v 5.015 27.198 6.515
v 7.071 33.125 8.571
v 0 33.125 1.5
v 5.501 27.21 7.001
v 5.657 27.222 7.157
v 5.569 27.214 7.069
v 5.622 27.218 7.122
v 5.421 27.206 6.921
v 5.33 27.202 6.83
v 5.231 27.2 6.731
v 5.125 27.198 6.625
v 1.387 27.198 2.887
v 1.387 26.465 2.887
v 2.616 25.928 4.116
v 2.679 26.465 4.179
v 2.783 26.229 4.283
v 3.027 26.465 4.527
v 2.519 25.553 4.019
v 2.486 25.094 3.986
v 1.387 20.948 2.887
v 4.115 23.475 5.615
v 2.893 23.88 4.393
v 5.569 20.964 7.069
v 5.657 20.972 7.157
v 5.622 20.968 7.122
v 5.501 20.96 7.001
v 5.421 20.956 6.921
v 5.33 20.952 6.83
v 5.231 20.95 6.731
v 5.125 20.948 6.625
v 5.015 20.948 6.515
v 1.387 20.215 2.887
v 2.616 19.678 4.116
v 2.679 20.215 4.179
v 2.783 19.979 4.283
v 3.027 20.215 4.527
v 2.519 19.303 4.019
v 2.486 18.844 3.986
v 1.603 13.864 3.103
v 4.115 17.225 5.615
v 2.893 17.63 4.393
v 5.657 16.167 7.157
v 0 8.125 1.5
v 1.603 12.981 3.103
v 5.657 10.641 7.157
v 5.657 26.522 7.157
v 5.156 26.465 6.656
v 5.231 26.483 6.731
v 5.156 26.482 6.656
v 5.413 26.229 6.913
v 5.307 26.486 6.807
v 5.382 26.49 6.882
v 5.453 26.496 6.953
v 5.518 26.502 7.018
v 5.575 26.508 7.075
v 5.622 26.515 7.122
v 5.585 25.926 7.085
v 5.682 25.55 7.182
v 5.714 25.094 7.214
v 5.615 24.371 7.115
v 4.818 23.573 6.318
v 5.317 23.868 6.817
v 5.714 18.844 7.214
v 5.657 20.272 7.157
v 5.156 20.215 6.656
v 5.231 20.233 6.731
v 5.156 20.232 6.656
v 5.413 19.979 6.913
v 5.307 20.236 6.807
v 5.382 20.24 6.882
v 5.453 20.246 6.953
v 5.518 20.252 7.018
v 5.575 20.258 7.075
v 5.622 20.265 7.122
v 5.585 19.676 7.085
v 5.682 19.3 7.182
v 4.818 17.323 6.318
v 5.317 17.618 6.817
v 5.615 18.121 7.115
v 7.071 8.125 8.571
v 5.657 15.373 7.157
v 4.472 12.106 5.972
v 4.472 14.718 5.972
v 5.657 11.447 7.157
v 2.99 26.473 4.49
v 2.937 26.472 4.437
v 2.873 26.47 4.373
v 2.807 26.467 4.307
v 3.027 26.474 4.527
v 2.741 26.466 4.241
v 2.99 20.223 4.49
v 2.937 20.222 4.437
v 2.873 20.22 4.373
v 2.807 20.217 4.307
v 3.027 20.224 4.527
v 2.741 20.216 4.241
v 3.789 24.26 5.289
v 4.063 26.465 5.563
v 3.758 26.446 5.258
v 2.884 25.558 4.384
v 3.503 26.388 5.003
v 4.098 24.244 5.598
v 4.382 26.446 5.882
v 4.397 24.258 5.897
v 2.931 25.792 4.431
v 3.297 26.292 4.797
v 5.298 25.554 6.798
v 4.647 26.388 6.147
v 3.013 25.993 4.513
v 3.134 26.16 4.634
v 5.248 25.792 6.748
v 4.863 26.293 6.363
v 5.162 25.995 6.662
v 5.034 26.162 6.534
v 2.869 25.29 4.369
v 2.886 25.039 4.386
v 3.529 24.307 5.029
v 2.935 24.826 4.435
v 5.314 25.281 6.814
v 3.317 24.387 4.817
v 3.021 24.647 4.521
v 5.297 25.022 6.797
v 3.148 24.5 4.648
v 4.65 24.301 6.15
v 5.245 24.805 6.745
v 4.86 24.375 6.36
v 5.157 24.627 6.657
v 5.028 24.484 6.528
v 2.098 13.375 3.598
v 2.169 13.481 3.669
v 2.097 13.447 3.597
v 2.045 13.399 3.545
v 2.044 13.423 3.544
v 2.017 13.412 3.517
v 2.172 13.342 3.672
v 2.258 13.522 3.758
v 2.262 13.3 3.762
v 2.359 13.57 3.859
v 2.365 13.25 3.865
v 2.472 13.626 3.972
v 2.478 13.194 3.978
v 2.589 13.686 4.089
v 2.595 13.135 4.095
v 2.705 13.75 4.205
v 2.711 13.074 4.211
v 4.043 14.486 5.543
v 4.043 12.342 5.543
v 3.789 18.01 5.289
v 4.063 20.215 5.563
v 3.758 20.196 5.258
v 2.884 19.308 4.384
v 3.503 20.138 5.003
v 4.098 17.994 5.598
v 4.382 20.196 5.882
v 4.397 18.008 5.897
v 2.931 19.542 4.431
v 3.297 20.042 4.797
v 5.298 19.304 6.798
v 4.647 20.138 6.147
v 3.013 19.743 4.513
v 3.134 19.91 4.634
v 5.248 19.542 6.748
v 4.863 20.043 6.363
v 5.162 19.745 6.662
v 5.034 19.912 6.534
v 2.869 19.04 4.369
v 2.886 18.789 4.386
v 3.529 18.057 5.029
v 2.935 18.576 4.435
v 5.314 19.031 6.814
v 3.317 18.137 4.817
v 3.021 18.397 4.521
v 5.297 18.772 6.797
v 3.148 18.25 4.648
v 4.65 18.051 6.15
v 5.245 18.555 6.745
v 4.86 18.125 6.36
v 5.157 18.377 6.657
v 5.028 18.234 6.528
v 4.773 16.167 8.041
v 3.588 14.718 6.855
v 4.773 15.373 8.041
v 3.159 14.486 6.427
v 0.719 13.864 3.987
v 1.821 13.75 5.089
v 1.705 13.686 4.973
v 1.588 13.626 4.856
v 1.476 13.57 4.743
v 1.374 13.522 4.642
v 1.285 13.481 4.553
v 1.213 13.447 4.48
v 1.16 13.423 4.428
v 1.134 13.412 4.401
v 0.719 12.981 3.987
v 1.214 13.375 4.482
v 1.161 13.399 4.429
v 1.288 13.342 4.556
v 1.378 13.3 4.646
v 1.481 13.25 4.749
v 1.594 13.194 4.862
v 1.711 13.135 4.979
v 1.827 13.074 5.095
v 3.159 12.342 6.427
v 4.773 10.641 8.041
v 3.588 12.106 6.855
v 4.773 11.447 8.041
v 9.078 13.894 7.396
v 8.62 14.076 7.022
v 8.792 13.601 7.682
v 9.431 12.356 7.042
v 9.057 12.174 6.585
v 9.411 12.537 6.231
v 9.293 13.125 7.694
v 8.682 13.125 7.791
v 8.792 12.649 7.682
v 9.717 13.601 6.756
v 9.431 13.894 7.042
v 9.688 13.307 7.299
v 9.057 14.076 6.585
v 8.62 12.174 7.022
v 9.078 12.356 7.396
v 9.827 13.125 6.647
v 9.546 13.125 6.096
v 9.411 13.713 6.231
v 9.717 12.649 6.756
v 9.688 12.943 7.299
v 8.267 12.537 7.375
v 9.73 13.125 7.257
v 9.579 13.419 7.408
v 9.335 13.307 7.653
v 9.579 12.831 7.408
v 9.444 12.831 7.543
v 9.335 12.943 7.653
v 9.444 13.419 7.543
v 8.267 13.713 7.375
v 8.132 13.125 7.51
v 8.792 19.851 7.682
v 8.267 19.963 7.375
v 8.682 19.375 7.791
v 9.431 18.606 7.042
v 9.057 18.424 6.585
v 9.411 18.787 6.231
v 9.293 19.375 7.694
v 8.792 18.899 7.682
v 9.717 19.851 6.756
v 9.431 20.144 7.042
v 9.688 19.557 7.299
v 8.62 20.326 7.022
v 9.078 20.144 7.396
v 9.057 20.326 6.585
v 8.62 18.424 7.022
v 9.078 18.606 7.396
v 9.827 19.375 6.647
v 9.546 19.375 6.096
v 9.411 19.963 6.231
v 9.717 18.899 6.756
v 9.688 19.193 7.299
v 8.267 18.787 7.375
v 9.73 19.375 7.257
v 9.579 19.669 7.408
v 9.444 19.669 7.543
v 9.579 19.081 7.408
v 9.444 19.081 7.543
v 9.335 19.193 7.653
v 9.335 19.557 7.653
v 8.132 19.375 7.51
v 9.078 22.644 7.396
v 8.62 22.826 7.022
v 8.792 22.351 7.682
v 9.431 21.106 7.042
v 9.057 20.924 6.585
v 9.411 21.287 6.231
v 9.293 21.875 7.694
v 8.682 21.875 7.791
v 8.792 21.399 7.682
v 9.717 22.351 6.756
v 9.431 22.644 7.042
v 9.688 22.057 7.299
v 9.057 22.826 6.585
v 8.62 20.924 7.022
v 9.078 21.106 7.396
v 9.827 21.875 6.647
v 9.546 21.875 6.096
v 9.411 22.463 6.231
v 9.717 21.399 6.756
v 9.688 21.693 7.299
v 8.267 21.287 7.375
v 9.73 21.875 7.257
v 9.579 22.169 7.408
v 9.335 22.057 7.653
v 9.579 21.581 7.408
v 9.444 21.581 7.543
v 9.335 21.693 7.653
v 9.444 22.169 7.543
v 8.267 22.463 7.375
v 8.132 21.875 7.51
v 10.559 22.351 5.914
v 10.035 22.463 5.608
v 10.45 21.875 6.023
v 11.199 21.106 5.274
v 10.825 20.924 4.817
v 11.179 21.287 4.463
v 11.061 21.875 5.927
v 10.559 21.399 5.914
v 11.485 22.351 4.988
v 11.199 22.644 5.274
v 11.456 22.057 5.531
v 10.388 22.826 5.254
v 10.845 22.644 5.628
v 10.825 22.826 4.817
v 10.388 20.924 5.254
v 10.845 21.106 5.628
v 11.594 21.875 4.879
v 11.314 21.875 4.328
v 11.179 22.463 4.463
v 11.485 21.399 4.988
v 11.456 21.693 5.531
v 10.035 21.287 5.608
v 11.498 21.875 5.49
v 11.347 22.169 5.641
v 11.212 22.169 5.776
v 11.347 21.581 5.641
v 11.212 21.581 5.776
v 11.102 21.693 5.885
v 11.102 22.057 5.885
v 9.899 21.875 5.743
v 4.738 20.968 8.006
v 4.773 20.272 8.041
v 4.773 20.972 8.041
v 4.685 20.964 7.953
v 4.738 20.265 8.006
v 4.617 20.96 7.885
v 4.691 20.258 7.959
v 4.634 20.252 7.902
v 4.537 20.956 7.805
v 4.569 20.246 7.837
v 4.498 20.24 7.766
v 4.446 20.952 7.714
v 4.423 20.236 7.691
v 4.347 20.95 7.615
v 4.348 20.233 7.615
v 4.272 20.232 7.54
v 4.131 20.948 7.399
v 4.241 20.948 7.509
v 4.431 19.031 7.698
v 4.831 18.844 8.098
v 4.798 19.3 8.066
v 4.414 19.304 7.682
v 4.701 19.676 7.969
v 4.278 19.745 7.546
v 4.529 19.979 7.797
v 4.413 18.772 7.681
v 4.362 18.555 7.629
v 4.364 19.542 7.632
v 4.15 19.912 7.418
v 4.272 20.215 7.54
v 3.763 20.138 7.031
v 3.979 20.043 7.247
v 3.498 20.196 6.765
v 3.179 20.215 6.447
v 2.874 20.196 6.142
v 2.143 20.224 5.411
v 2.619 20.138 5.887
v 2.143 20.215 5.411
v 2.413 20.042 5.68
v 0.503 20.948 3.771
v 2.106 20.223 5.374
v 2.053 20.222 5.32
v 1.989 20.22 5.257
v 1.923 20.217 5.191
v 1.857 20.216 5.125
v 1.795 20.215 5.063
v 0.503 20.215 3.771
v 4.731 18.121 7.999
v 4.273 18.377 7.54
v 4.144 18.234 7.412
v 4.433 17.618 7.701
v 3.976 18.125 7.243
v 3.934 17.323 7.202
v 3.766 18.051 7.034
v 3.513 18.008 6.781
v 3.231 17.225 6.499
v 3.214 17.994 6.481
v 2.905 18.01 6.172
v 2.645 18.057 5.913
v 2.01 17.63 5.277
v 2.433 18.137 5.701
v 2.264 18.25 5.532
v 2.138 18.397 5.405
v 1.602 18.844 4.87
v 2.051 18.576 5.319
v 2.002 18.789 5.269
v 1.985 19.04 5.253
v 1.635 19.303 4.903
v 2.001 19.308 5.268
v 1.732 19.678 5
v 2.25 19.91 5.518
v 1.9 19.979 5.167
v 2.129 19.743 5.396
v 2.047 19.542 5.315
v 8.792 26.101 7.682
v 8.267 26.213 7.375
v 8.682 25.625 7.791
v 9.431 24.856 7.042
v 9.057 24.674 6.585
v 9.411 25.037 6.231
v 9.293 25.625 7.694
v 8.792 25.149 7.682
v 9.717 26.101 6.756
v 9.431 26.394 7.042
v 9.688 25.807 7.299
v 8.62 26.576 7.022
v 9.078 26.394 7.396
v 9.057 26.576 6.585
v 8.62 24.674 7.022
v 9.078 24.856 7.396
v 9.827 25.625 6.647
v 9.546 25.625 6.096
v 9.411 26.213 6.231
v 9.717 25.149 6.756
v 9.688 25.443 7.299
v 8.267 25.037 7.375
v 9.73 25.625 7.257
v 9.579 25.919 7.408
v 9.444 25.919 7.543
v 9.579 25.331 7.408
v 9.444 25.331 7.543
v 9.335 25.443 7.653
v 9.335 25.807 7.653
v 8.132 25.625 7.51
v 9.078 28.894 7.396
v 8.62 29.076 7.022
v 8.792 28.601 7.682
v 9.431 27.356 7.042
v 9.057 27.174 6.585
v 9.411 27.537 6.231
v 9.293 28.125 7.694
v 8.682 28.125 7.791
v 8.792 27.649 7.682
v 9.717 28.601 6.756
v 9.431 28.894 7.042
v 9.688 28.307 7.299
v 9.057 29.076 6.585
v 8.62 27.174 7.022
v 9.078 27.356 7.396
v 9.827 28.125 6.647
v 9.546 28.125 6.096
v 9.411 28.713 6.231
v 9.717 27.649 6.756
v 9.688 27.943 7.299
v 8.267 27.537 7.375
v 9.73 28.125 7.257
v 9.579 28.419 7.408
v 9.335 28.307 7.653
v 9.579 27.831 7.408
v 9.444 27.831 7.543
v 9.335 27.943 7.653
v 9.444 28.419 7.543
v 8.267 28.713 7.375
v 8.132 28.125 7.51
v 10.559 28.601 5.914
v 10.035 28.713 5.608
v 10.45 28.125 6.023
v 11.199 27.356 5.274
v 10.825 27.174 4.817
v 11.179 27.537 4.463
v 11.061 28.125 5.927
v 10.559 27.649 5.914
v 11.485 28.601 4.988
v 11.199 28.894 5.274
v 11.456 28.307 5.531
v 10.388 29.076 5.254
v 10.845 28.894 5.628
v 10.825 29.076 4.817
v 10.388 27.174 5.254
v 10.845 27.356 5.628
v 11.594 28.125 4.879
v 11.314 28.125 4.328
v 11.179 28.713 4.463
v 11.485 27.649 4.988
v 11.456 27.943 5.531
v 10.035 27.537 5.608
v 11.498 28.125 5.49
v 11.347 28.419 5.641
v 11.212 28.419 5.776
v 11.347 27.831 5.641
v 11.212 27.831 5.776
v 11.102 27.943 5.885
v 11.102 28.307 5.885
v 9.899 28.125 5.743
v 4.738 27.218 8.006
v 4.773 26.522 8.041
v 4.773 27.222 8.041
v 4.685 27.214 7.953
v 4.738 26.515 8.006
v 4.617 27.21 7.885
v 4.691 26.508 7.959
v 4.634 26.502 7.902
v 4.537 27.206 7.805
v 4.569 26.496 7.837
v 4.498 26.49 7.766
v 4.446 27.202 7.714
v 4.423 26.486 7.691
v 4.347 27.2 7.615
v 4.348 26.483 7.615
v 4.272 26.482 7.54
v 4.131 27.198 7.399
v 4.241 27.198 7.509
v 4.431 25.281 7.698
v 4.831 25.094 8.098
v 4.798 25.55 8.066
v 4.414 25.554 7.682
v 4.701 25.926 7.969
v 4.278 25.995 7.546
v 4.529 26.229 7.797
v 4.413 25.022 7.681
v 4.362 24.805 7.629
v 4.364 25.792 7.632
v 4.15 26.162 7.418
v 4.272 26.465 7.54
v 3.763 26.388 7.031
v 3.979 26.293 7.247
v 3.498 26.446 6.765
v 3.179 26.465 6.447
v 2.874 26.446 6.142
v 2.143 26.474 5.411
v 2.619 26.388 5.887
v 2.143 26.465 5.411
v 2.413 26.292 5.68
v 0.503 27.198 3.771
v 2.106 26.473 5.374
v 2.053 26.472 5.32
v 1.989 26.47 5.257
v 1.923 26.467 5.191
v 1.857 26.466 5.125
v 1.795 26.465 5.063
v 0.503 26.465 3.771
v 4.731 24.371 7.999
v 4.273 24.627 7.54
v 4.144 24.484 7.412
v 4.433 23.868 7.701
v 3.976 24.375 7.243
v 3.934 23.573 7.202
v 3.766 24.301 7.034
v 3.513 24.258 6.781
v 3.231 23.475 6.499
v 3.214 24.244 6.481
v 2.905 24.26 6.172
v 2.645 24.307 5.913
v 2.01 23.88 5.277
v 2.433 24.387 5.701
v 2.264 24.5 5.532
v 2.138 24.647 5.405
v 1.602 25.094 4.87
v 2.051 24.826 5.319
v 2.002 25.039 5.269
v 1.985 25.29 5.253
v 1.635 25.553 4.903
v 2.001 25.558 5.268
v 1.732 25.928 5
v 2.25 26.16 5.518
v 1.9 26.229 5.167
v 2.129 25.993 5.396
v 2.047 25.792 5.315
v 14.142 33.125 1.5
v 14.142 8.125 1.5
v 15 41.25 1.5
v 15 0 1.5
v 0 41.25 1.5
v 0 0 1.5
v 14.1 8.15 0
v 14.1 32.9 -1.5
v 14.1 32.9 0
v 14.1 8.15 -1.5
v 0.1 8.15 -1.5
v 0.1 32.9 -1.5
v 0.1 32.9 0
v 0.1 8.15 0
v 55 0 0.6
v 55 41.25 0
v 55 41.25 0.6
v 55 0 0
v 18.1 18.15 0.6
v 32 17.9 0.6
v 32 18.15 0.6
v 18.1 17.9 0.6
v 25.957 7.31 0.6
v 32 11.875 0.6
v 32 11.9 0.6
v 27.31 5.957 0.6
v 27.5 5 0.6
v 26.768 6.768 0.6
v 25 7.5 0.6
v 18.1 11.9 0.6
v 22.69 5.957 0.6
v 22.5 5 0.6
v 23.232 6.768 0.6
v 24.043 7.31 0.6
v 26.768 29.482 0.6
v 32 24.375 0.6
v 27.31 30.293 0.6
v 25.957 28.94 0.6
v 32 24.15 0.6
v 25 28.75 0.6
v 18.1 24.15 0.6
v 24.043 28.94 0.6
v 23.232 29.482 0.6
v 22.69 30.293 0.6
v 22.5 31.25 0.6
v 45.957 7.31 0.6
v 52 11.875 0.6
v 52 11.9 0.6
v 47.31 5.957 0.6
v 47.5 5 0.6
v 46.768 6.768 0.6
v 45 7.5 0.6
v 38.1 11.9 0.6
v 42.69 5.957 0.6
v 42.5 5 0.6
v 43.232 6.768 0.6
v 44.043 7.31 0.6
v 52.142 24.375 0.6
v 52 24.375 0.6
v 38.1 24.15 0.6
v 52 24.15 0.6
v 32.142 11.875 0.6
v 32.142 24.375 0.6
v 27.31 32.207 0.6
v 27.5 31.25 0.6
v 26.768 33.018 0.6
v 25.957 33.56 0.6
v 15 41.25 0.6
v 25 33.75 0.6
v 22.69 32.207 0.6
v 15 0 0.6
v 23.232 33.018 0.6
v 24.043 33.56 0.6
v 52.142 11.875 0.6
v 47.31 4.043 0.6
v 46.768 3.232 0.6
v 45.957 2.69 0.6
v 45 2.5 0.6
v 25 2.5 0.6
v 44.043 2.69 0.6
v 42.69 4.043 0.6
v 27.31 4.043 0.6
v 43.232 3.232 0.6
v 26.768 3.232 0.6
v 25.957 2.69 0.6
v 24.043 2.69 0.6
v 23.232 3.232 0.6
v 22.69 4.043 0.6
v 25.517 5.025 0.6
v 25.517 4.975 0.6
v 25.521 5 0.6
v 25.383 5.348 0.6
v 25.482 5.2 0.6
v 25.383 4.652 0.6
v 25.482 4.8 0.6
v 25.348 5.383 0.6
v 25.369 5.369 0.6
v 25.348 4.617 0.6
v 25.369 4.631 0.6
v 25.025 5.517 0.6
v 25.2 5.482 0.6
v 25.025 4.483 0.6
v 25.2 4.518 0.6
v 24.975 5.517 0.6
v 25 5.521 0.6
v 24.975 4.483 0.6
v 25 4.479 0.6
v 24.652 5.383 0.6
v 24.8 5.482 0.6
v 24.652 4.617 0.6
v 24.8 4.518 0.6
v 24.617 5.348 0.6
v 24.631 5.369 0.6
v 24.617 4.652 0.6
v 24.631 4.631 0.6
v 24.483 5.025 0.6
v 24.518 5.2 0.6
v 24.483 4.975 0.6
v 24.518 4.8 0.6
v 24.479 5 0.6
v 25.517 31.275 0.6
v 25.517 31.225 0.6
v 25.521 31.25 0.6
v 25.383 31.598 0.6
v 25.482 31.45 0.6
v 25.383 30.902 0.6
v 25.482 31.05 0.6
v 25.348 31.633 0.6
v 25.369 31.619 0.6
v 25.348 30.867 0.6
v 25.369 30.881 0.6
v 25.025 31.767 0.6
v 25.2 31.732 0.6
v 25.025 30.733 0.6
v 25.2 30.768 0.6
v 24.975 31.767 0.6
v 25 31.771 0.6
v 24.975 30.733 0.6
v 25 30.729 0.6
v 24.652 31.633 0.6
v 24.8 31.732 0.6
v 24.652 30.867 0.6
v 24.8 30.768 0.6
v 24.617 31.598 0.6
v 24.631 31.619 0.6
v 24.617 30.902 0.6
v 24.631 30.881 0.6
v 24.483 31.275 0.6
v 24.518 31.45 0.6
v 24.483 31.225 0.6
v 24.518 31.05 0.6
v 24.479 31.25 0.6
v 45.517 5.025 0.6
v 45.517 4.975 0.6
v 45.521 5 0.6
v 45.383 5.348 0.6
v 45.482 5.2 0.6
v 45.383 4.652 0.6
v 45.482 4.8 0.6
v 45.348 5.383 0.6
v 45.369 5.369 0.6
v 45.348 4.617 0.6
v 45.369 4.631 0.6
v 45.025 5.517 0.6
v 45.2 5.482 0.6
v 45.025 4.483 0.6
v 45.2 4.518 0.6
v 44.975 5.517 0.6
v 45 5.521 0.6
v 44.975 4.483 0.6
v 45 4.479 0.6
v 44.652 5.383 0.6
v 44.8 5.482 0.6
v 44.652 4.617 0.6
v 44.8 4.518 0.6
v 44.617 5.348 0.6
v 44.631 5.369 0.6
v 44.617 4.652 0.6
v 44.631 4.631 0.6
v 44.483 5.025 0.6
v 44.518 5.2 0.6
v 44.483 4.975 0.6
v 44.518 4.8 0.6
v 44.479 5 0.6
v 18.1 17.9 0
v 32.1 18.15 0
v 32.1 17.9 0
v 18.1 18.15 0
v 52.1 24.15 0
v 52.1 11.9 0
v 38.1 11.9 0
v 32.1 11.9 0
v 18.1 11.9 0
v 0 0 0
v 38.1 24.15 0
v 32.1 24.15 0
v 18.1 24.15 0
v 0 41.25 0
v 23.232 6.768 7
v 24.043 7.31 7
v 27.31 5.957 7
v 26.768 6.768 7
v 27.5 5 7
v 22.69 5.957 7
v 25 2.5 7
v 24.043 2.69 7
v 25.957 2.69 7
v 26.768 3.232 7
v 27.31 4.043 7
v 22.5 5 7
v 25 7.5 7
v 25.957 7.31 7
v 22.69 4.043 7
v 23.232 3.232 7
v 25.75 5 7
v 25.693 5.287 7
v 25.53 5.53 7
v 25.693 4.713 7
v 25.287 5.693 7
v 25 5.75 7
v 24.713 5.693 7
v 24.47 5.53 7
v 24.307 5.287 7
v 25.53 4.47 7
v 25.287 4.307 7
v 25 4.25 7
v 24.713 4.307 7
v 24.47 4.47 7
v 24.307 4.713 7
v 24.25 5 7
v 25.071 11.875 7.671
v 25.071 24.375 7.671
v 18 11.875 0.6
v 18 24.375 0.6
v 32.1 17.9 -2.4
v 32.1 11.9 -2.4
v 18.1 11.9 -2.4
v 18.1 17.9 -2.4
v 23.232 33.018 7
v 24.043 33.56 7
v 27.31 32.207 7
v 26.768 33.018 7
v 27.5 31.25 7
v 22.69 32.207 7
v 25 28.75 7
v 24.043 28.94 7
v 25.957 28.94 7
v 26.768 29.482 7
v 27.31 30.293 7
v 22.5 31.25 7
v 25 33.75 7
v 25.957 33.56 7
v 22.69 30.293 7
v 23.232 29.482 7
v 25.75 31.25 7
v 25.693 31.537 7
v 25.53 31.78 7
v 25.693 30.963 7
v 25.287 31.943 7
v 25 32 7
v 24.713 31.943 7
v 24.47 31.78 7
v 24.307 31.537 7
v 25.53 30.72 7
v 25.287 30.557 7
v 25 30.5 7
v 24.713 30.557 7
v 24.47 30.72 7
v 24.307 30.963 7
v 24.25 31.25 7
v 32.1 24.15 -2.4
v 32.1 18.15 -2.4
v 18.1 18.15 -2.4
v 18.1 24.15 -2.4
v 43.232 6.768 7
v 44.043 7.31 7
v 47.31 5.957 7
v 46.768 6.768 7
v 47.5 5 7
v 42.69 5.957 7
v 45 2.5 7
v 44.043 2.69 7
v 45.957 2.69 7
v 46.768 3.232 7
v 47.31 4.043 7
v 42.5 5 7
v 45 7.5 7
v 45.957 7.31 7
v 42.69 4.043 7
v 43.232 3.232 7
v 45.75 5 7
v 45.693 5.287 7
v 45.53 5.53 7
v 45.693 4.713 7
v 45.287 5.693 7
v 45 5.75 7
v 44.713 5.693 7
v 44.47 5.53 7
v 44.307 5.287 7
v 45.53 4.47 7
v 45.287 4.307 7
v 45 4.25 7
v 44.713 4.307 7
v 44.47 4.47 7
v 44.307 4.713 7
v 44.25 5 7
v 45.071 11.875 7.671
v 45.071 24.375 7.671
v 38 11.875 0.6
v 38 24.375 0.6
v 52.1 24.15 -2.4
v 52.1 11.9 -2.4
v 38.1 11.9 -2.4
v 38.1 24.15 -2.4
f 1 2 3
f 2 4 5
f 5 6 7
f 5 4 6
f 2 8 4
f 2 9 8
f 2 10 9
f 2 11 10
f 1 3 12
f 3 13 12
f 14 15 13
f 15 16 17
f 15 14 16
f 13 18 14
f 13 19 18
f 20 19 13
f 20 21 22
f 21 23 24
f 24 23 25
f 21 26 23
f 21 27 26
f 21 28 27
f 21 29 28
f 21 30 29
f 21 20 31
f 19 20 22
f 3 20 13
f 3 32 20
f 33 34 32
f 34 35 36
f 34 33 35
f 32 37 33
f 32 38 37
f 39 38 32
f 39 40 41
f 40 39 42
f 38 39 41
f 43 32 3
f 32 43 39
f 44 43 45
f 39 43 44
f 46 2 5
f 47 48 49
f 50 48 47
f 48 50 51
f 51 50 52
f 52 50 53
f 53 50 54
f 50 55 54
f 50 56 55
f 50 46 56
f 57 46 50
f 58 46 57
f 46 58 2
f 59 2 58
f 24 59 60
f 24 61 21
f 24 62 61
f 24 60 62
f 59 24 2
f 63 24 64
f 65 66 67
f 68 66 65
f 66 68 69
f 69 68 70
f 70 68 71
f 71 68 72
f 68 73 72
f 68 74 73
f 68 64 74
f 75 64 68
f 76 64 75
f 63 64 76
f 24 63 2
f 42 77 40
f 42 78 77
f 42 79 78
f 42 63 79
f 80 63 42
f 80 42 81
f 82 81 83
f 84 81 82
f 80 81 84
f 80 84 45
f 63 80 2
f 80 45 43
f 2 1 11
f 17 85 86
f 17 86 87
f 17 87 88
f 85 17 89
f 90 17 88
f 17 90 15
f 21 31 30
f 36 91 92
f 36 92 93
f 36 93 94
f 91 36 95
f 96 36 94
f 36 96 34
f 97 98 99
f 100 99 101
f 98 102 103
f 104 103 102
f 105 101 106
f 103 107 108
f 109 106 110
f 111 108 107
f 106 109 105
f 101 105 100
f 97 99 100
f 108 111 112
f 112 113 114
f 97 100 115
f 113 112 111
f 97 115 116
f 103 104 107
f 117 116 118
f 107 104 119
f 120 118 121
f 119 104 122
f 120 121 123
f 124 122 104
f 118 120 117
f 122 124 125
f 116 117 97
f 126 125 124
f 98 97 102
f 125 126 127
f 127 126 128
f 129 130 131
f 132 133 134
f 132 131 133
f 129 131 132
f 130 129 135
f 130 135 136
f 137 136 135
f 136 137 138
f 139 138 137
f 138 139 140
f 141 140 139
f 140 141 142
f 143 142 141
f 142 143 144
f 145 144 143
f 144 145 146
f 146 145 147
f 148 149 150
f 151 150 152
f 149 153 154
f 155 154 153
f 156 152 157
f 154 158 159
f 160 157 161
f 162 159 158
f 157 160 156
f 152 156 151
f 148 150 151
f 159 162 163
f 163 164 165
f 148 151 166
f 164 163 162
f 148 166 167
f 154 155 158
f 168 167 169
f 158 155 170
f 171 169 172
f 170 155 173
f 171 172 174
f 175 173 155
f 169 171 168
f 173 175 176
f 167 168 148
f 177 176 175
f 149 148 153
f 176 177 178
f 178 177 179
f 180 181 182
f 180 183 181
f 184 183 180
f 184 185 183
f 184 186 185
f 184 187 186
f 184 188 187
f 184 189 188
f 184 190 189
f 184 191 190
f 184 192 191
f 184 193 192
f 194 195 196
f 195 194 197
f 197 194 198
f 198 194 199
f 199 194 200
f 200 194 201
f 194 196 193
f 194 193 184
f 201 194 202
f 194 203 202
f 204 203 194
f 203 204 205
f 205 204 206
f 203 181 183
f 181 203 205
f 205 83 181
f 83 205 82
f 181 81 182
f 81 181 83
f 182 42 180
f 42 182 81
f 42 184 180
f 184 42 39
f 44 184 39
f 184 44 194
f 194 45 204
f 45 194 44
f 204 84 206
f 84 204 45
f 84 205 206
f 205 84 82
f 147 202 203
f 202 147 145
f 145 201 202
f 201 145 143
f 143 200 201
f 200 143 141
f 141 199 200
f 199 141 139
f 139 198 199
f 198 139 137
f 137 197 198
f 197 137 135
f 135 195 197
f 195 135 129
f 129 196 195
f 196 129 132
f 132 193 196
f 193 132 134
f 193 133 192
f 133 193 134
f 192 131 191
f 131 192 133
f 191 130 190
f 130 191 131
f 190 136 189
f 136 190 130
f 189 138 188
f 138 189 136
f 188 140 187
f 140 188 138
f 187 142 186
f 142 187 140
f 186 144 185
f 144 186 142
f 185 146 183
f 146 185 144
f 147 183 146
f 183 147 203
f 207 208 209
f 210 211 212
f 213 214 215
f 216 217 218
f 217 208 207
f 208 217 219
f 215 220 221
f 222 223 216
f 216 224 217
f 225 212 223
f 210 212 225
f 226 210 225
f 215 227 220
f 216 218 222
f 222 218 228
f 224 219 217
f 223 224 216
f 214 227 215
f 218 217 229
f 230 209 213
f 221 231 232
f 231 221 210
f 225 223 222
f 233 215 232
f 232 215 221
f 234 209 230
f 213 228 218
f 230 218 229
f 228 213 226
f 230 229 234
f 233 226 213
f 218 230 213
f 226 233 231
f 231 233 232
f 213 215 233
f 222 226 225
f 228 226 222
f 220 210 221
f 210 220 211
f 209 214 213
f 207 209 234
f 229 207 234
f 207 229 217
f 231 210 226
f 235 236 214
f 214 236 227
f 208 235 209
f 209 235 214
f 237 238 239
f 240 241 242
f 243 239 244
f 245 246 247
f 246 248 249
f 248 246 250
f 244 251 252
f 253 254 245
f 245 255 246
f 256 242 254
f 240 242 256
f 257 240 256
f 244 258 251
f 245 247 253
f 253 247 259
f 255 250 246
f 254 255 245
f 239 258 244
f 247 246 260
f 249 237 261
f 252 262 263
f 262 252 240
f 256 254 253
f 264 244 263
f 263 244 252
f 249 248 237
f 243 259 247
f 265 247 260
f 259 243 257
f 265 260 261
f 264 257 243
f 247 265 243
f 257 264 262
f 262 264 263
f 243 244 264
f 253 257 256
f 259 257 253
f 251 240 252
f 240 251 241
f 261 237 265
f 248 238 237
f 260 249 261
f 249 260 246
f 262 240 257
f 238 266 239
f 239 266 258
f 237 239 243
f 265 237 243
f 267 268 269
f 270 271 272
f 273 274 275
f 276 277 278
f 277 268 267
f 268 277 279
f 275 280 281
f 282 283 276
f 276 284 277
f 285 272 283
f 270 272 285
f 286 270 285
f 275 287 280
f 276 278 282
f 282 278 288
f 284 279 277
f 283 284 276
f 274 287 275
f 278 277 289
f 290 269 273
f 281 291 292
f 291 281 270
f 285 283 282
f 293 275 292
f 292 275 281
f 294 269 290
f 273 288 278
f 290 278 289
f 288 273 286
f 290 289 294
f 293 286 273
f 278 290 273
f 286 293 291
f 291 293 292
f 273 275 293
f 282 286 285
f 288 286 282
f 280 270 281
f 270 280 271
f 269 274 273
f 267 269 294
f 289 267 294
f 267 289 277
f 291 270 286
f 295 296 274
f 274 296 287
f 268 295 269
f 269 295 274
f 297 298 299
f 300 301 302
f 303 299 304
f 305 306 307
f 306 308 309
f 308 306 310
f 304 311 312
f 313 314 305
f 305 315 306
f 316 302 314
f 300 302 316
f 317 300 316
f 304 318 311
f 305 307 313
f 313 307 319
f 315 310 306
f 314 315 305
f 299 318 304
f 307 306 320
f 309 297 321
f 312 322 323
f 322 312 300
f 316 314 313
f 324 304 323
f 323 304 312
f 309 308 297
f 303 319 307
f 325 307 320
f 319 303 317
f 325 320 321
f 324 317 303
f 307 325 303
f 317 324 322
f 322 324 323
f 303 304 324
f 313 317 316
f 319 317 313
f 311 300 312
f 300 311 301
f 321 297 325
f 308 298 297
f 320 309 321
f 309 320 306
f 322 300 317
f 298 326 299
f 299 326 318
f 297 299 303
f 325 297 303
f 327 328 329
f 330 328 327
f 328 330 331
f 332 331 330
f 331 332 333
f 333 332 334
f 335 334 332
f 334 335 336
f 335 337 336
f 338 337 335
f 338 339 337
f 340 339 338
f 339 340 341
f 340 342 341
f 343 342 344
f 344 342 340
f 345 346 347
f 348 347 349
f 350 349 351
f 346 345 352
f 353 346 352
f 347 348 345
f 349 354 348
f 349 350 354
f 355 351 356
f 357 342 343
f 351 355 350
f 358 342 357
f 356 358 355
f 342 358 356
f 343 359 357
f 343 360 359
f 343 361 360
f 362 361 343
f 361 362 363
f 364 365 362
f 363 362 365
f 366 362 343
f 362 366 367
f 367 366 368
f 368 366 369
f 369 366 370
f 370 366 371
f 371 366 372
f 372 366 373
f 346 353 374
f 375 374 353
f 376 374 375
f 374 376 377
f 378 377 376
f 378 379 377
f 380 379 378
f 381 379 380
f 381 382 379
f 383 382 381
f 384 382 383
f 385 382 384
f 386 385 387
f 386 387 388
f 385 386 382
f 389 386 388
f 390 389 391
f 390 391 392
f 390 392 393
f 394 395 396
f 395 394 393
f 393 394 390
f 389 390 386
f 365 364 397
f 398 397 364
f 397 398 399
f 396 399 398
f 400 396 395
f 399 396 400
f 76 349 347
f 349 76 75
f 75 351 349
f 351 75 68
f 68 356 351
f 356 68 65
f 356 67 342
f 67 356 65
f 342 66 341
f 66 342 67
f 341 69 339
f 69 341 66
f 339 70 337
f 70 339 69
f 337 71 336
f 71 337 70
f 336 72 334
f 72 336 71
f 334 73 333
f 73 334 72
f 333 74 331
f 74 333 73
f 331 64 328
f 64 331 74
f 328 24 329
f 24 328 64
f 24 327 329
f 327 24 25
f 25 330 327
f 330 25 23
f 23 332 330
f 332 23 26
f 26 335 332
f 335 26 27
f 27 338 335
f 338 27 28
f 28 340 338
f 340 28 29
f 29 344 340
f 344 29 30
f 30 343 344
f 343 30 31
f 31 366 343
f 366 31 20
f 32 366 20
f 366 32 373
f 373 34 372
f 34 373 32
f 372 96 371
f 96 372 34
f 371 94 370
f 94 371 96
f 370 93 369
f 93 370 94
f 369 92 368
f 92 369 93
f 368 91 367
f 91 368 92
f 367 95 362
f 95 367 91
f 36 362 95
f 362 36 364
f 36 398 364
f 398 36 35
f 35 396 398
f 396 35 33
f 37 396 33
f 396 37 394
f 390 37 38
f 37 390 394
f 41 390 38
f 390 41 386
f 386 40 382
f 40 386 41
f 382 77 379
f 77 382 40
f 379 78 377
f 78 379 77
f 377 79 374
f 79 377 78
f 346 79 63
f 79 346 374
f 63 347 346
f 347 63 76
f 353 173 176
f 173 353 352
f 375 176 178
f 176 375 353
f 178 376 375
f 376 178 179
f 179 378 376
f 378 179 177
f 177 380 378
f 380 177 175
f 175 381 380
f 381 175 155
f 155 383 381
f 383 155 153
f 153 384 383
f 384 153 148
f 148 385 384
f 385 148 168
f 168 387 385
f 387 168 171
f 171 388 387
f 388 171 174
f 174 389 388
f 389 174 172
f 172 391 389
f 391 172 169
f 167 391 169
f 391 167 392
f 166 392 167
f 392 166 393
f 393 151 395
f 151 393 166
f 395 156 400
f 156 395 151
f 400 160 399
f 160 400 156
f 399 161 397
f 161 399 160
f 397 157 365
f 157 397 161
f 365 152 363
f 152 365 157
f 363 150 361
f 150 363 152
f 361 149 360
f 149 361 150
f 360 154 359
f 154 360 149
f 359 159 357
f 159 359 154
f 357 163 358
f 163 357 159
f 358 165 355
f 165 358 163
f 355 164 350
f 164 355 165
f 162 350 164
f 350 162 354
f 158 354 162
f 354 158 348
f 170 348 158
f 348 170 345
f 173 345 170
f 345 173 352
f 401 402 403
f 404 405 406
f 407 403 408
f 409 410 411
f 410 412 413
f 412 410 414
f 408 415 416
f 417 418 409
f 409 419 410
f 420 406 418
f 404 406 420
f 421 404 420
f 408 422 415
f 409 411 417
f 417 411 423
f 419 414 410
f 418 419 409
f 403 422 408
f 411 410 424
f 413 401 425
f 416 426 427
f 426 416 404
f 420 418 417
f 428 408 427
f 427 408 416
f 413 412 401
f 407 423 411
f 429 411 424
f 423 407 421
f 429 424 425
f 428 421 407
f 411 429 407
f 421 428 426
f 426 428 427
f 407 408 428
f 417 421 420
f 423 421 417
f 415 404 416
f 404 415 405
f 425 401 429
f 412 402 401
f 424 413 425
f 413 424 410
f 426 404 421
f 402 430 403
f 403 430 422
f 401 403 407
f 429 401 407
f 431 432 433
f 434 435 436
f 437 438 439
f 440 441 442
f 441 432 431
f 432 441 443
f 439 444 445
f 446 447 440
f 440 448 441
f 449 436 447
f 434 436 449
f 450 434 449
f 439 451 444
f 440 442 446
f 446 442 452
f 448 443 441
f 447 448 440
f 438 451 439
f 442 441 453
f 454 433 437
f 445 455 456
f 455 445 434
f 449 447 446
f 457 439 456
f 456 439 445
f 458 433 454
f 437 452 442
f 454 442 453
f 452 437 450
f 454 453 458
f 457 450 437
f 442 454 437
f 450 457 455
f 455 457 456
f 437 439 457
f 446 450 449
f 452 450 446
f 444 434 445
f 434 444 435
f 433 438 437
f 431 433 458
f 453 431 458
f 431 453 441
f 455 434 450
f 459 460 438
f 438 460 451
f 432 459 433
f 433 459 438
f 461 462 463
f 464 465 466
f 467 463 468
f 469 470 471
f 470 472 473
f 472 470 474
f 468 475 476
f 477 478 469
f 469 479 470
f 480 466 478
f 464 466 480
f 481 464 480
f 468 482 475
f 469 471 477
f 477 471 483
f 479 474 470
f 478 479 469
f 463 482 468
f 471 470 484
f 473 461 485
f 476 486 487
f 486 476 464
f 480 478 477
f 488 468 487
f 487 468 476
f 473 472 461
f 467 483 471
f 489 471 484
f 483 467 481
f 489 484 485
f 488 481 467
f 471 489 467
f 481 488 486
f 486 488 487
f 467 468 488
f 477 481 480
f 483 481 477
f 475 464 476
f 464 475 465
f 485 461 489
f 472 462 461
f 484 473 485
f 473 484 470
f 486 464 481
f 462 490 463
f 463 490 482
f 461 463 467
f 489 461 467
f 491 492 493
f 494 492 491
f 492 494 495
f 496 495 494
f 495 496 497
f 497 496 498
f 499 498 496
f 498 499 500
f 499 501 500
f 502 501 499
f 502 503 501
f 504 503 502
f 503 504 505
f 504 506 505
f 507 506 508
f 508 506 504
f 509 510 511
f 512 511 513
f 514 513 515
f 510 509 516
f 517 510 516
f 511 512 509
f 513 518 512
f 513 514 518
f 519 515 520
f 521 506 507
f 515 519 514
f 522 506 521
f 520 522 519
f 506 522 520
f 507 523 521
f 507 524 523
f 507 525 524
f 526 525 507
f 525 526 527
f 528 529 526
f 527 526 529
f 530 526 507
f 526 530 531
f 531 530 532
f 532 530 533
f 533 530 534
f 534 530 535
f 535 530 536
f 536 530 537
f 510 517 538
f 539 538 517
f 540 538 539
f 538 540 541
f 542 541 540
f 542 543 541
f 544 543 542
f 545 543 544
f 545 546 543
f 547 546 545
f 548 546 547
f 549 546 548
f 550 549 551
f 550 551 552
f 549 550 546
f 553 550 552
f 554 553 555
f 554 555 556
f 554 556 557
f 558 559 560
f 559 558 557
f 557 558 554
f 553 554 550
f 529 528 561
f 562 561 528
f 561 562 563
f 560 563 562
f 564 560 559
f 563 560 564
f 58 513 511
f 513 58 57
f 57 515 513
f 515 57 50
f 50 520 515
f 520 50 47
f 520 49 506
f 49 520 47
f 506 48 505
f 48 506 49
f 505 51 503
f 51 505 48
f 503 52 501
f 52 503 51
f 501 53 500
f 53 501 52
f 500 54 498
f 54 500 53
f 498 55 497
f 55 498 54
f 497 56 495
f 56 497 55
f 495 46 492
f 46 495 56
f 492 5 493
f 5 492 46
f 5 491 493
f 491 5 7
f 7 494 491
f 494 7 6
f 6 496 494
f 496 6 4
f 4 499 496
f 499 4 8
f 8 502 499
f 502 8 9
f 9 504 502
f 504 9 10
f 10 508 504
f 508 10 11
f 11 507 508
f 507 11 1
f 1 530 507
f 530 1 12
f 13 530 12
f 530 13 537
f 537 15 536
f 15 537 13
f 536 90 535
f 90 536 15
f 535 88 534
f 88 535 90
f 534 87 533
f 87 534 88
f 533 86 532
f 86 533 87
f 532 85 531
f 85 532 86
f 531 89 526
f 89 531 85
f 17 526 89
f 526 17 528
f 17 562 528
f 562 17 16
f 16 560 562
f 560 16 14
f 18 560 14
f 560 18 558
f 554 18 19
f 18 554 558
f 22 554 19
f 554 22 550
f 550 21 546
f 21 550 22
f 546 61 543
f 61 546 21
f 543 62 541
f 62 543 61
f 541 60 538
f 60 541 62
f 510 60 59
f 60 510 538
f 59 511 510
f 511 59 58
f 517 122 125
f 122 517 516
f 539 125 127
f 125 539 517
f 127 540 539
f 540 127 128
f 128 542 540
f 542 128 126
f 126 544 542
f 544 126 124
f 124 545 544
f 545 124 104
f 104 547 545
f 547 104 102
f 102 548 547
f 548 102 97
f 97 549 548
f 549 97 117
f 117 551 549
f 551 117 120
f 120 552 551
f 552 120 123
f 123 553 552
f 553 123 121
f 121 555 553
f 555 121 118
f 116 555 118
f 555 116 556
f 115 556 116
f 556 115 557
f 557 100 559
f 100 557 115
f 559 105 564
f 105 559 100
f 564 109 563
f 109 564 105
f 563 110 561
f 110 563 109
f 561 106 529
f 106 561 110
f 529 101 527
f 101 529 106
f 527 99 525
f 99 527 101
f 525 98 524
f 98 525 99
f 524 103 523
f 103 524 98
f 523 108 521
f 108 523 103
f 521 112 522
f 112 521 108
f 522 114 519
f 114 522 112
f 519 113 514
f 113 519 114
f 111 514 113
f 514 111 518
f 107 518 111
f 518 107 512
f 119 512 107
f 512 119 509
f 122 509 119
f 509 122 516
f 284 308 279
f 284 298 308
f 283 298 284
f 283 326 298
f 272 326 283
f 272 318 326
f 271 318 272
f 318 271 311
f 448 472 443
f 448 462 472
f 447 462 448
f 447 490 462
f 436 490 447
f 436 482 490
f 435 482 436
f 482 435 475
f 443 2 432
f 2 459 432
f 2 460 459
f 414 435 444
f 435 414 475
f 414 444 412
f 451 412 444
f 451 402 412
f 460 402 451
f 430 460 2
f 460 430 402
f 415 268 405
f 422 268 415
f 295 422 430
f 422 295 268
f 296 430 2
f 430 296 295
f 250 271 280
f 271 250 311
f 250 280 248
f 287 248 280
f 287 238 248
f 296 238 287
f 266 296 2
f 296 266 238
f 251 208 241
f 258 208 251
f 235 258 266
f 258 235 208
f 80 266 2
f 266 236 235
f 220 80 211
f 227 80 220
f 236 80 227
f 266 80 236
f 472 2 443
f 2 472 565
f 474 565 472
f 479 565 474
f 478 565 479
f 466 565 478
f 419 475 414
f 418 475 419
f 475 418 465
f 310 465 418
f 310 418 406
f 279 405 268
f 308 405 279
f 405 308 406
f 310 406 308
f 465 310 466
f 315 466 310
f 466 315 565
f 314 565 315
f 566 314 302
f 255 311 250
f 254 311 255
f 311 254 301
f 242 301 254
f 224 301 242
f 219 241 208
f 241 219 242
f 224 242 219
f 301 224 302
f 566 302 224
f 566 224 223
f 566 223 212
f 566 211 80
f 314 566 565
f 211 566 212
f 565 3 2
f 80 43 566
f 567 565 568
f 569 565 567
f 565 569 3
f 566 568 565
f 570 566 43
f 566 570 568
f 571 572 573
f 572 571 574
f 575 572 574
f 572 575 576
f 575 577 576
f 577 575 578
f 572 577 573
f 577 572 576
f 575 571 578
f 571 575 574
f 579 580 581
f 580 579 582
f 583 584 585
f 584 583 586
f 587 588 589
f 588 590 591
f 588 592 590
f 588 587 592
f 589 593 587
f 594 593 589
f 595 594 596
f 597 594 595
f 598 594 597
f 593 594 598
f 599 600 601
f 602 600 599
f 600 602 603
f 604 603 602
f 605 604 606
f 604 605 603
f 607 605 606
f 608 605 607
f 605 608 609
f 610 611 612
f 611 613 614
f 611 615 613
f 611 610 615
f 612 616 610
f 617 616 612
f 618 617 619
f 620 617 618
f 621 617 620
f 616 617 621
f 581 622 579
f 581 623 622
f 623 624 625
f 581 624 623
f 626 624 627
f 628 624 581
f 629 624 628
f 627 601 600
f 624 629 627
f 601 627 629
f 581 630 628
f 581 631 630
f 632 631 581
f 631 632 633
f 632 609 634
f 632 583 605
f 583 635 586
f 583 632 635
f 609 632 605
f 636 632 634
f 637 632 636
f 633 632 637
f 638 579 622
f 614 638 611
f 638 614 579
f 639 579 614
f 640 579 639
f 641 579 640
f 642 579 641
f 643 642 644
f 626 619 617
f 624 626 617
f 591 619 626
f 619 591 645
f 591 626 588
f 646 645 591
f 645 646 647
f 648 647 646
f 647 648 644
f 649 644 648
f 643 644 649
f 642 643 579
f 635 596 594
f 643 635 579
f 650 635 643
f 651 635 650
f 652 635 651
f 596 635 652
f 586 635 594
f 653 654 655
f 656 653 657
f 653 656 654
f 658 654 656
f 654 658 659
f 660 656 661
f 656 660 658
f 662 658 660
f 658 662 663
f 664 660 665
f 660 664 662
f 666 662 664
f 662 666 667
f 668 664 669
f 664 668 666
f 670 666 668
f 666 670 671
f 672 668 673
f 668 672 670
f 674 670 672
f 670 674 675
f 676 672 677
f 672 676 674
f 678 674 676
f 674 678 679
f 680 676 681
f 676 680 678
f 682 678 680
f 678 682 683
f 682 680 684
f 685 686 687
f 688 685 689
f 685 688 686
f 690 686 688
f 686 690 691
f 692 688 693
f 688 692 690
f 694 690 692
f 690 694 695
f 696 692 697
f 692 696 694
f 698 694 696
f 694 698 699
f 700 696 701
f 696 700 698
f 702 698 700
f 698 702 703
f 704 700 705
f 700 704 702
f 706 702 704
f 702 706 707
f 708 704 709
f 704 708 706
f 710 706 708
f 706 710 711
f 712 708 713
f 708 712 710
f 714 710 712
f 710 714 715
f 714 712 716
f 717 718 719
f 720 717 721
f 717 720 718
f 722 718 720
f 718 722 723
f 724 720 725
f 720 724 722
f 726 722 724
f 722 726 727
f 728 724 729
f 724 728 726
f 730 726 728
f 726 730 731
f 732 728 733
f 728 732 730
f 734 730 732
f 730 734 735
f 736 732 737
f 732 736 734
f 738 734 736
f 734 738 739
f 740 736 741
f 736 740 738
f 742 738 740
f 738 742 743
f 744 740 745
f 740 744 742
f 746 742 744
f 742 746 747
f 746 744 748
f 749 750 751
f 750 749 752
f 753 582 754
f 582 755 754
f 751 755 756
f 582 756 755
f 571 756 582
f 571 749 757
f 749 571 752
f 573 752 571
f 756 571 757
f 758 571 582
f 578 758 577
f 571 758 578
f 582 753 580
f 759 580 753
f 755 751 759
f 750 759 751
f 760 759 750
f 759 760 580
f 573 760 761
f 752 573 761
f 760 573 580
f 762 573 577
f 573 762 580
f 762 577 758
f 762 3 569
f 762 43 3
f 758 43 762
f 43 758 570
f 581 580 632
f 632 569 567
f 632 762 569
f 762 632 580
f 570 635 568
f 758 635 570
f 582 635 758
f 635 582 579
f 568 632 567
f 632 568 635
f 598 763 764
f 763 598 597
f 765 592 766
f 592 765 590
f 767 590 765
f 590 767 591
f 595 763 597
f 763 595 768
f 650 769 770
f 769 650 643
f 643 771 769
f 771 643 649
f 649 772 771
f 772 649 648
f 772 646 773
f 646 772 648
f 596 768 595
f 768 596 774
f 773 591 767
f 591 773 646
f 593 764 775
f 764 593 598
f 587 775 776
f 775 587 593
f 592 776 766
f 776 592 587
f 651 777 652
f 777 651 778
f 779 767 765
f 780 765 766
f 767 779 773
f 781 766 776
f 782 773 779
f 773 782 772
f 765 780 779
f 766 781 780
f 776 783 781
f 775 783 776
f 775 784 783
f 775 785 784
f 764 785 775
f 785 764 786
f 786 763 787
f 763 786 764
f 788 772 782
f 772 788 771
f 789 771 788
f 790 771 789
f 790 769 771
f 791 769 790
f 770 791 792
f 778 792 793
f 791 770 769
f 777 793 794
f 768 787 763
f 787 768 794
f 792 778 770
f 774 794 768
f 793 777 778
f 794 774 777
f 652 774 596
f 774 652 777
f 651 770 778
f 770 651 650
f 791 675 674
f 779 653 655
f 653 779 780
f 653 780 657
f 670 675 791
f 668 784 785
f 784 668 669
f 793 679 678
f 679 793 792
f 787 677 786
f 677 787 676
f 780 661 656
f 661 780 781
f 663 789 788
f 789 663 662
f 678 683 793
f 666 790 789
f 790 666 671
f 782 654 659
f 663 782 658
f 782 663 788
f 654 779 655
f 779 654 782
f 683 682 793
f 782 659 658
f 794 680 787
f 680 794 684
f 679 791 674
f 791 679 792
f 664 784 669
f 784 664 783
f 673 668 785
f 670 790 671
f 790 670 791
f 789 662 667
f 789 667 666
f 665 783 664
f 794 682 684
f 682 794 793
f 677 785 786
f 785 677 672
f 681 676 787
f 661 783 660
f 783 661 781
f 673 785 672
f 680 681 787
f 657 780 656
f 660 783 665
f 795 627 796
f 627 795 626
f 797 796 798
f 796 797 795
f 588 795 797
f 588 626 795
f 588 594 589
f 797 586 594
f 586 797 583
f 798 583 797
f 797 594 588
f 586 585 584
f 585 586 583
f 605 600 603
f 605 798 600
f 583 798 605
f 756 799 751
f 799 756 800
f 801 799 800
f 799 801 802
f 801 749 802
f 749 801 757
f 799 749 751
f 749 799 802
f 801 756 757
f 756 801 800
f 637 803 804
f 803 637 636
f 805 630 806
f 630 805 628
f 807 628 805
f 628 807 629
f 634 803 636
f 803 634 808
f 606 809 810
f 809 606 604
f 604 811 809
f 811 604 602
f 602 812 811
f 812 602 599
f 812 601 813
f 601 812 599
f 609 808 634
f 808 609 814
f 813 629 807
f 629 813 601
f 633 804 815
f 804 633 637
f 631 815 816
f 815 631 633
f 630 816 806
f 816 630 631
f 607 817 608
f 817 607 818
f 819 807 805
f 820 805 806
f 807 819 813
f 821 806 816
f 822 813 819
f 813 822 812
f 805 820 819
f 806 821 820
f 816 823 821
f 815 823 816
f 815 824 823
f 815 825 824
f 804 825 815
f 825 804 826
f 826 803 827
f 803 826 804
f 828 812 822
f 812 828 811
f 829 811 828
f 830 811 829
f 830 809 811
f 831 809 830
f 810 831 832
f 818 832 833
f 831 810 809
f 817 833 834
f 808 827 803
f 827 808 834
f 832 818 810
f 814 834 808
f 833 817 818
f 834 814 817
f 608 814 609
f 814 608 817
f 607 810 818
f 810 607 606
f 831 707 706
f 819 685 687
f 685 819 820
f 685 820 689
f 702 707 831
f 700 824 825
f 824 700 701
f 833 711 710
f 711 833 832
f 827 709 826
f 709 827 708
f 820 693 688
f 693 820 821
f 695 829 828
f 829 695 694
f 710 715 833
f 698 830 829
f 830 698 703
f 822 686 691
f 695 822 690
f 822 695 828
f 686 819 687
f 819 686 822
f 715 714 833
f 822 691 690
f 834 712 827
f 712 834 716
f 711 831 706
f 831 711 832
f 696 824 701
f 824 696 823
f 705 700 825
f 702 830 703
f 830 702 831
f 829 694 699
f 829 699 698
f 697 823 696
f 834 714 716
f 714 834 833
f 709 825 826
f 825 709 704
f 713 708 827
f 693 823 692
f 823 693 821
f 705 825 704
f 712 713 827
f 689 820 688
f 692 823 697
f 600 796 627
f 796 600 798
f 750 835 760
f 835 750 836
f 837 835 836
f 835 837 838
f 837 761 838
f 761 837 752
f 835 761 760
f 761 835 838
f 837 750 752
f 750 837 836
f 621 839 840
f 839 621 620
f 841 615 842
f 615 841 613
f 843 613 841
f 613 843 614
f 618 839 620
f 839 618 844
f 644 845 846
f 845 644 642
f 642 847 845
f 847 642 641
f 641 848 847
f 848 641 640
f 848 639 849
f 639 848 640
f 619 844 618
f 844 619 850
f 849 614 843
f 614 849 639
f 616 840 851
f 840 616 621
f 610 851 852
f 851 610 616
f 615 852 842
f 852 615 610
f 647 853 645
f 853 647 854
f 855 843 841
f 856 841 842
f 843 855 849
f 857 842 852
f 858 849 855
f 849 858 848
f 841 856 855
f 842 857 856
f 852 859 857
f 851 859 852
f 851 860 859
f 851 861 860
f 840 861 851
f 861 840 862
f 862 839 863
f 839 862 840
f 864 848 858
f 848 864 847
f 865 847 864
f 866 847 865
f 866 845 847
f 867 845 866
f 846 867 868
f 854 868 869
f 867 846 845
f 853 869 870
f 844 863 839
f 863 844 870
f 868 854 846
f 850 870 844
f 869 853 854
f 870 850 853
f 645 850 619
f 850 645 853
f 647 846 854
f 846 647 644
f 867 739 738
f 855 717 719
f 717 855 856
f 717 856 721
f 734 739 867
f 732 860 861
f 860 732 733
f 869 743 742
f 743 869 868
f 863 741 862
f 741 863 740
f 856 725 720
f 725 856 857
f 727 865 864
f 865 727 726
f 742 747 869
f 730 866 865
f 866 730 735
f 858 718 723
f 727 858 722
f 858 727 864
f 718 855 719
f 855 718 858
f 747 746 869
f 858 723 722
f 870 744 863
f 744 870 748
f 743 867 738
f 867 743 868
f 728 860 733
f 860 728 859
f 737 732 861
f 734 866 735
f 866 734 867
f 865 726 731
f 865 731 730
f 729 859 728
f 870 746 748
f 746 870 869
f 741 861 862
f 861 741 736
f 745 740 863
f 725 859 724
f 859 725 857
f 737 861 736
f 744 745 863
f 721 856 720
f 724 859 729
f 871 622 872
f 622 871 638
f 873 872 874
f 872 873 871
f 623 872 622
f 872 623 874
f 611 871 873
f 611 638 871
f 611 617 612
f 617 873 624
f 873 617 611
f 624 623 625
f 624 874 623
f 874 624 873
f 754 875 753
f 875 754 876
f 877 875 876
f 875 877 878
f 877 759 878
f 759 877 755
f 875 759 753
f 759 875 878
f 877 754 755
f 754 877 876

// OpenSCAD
// file: ../OpenSCAD/Pin.scad
// Height of pins
pinHeight = 7;      // was 7
// ----------------------------------------------------- //
// Draw a cylinder and drill a hole in it                //
// ----------------------------------------------------- //
module pin(px, py, pz) {
    translate([px, py, pz]) {
        difference() {
            cylinder(h=pinHeight, r=2.5, $fn=16);
            translate([2, 2, 1]);
                cylinder(h=pinHeight, r1=0.5, r2=0.75, $fn=16);
        }
    }   
}

// pin(0, 0, 0);
// file: ../OpenSCAD/brailleAndText.scad
/*
Braille Module
http://creativecommons.org/licenses/by/3.0/
*/


// mm sizes from http://dots.physics.orst.edu/gs_layout.html
radius = 0.25;
spacing = 2.5;
startOffset = 3.75;
distance = startOffset + spacing;

plate_height = 10;
plate_thickness = 10;   // was 2.

$fn = 10;



module letter(bitmap, char) {
//    echo(char);
	row_size = 2;
	col_size = 3;
	bitmap_size = row_size * col_size;
	
	function loc_x(loc) = floor(loc / row_size) * spacing + spacing;
	function loc_y(loc) = loc % row_size * spacing  + (distance-spacing)/2;

    translate([0, loc_y(-1), -2]) {
        rotate([270, 0, 90]) {
            linear_extrude(height = 1.25)
            text(char, 6);
        }
    }
	
    for (loc = [0:bitmap_size - 1]) {
		if (bitmap[loc] != 0) {
			union() {
				translate(v = [loc_x(loc), loc_y(loc), 0]) {
					sphere(radius = radius* bitmap[loc], center = true);
				}
			}
		}
	}
}


module braille_char(char) {
	if (char == "A" || char == "a") {
		letter([
			1,0,
			0,0,
			0,0
		], char);
	} else if (char == "B" || char == "b") {
		letter([
			1,0,
			1,0,
			0,0
		], char);
	} else if (char == "C" || char == "c") {
		letter([
			1,1,
			0,0,
			0,0
		], char);
	} else if (char == "D" || char == "d") {
		letter([
			1,1,
			0,1,
			0,0
		], char);
	} else if (char == "E" || char == "e") {
		letter([
			1,0,
			0,1,
			0,0
		], char);
	} else if (char == "F" || char == "f") {
		letter([
			1,1,
			1,0,
			0,0
		], char);
	} else if (char == "G" || char == "g") {
		letter([
			1,1,
			1,1,
			0,0
		], char);
	} else if (char == "H" || char == "h") {
		letter([
			1,0,
			1,1,
			0,0
		], char);
	} else if (char == "I" || char == "i") {
		letter([
			0,1,
			1,0,
			0,0
		], char);
	} else if (char == "J" || char == "j") {
		letter([
			0,1,
			1,1,
			0,0
		], char);
	} else if (char == "K" || char == "k") {
		letter([
			1,0,
			0,0,
			1,0
		], char);
	} else if (char == "L" || char == "l") {
		letter([
			1,0,
			1,0,
			1,0
		], char);
	} else if (char == "M" || char == "m") {
		letter([
			1,1,
			0,0,
			1,0
		], char);
	} else if (char == "N" || char == "n") {
		letter([
			1,1,
			0,1,
			1,0
		], char);
	} else if (char == "O" || char == "o") {
		letter([
			1,0,
			0,1,
			1,0
		], char);
	} else if (char == "P" || char == "p") {
		letter([
			1,1,
			1,0,
			1,0
		], char);
	} else if (char == "Q" || char == "q") {
		letter([
			1,1,
			1,1,
			1,0
		], char);
	} else if (char == "R" || char == "r") {
		letter([
			1,0,
			1,1,
			1,0
		], char);
	} else if (char == "S" || char == "s") {
		letter([
			0,1,
			1,0,
			1,0
		], char);
	} else if (char == "T" || char == "t") {
		letter([
			0,1,
			1,1,
			1,0
		], char);
	} else if (char == "U" || char == "u") {
		letter([
			1,0,
			0,0,
			1,1
		], char);
	} else if (char == "V" || char == "v") {
		letter([
			1,0,
			1,1,
			1,0
		], char);
	} else if (char == "W" || char == "w") {
		letter([
			0,1,
			1,1,
			0,1
		], char);
	} else if (char == "X" || char == "x") {
		letter([
			1,1,
			0,0,
			1,1
		], char);
	} else if (char == "Y" || char == "y") {
		letter([
			1,1,
			0,1,
			1,1
		], char);
	} else if (char == "Z" || char == "z") {
		letter([
			1,0,
			0,1,
			1,1
		], char);
    } else if (char == " ") {
		letter([
			0,0,
			0,0,
			0,0
		], char);
	} else {
		echo("Invalid Character: ", char);
	}

}

module braille_str(chars) {
    char_count = len(chars);
	echo(str("Total Width of ", chars, " : ",  distance * char_count, "mm"));
	union() {
		for (count = [0:char_count-1]) {
			translate(v = [0, count * distance, plate_thickness]) {
				braille_char(chars[count]);
			}
		}
		translate(v = [0, -distance/2, 0]) {
			color([0,0,1]) {
				cube(size = [plate_height, distance * (char_count+1), plate_thickness]);
			}
            }                                                      
	}
}

function lenText(txt="Hi") = distance * len(txt);

module printTextAndBraille(textToPrint) {
    blockLen = lenText(textToPrint);
    union()
    {
        difference() {                      // remove second box from first
            rotate([0,45,0]) {              // make it on its edge
                braille_str((textToPrint)); // make a long box
            }
            translate([0, -3.25, -8]) {     // move in right place
                cube(size = [14, (blockLen+8), 8]);
            }
        } 
        translate([0.1, -3.1, -3]) {     // move in right place
            cube(size = [14, (blockLen+6), 3]); 
        }
    }                                 
}

printTextAndBraille("HELLO CalLUM");
// file: ../OpenSCAD/BPNode.scad
use <brailleAndText.scad>;
use <Pin.scad>;

// These are to be overridden in the generated file
// ... they are used to calculate size of base.
numLines = 1;  // was 5
longestLine = "abcdefghijk";

// Thickness of base
bedHeight = 0.6;      // was 4
// Thickness of top section
reliefHeight = 1.5;   // was 6
// Height of pins
pinHeight = 7;      // was 7

// size of base
baseWidth = 35 + len(longestLine) * 6.25;   // was 40
//baseWidth = 100;
baseDepth = (numLines - 1) * 20 + 15;
// depth of top section
reliefDepth = 15;

// Offsets for each line
line1 = 7;
line2 = line1 + 18;
line3 = line2 + 20;
line4 = line3 + 20;
line5 = line4 + 20;
line6 = line5 + 20;
line7 = line6 + 20;
line8 = line7 + 20;

// offset for items on the left and right
left = 5;
right = baseWidth - 10;


// ----------------------------------------------------- //
// Draw base, add raised area for title and add title    //
// ----------------------------------------------------- //
module drawBase(title) { 
    cube([baseDepth,baseWidth,bedHeight]);      // Base
    cube([reliefDepth,baseWidth,reliefHeight]); // Top
    translate([0, (baseWidth/2 - lenText(title)/2), reliefHeight])
        printTextAndBraille(title);             // Title
}

// -------------------------------------------------------------- //
// Draw cube and drill a hole in it,                              //
// - then add a cylinder made with four segments (i.e. a diamond) //
// -------------------------------------------------------------- //
module executePin(px, py) {
    translate([px, py, 0]) {
        difference() {
            translate([-2.5, -2.5, 0])
            cube([5, 6.5, pinHeight]);
            translate([2, 2, 1]);
            cylinder(h=pinHeight, r1=0.5, r2=0.75, $fn=16);
        }
        translate([0, 4, 0])
        cylinder(h=pinHeight, r=2.5, $fn=4);
    } 
}

module executePinLeft(line) {
   executePin(line2, left);
} 

module executePinRight(line) {
   executePin(line2, right);
} 

module executePinLeftWithText(px, text) {
    executePin(px, left);
    printText(px, left, text);    
}

module executePinRightWithText(px, text) {
    y = lenText(text) + 20 ;  
    executePin(px, right);
    printText(px, right - y, text);    
}


// ----------------------------------------------------- //
// Call module from 'brailleAndText' library to draw     //
// ... text and braille                                  //
// ----------------------------------------------------- //
module printText(px, py, textValue) {
    translate([px - 7, py + 10, bedHeight]) {
        printTextAndBraille(textValue);
    }
}

// ----------------------------------------------------- //
// Call modules to draw pin and text on the left         //
// ----------------------------------------------------- //
module leftPin(line, text) {   
    pin(line, left, 0);
    printText(line, left, text);
}

// ----------------------------------------------------- //
// Call modules to draw pin and text on the right        //
// ----------------------------------------------------- //
module rightPin(line, text) {
    y = lenText(text) + 20 ;  
    pin(line, right, 0);
    printText(line, right - y, text);
}


// ------------------------------------------------------------- //
// ------------------------------------------------------------- //
//                        T O    U S E  ;                        //
// 1. Create file and add the following line at the top;         //
// include <BPNode.scad>;                                        //
// 2. Change value of numLines and longestLine, as appropritate. //
// 3. Add any of the other commands below, as appropriate.       //
// ------------------------------------------------------------- //
// ------------------------------------------------------------- //


/*
// include <BPNode.scad>; 
numLines = 5;
longestLine = "abcdefghijk";

drawBase("Print");

executePinLeft(line2);
//executePinLeftWithText(line2, "TestA");
executePinRight(line2);
//executePinRightWithText(line2, "TestB");

leftPin(line3, "String");
leftPin(line4, "Text"); 
leftPin(line5, "Log"); 

rightPin(line3, "Out");
*/
// main file
include <../OpenSCAD/BPNode.scad>;

numLines = 3;
longestLine = "A";

drawBase("Add");

leftPin(line2, "");
rightPin(line2, "");

leftPin(line3, "1");
